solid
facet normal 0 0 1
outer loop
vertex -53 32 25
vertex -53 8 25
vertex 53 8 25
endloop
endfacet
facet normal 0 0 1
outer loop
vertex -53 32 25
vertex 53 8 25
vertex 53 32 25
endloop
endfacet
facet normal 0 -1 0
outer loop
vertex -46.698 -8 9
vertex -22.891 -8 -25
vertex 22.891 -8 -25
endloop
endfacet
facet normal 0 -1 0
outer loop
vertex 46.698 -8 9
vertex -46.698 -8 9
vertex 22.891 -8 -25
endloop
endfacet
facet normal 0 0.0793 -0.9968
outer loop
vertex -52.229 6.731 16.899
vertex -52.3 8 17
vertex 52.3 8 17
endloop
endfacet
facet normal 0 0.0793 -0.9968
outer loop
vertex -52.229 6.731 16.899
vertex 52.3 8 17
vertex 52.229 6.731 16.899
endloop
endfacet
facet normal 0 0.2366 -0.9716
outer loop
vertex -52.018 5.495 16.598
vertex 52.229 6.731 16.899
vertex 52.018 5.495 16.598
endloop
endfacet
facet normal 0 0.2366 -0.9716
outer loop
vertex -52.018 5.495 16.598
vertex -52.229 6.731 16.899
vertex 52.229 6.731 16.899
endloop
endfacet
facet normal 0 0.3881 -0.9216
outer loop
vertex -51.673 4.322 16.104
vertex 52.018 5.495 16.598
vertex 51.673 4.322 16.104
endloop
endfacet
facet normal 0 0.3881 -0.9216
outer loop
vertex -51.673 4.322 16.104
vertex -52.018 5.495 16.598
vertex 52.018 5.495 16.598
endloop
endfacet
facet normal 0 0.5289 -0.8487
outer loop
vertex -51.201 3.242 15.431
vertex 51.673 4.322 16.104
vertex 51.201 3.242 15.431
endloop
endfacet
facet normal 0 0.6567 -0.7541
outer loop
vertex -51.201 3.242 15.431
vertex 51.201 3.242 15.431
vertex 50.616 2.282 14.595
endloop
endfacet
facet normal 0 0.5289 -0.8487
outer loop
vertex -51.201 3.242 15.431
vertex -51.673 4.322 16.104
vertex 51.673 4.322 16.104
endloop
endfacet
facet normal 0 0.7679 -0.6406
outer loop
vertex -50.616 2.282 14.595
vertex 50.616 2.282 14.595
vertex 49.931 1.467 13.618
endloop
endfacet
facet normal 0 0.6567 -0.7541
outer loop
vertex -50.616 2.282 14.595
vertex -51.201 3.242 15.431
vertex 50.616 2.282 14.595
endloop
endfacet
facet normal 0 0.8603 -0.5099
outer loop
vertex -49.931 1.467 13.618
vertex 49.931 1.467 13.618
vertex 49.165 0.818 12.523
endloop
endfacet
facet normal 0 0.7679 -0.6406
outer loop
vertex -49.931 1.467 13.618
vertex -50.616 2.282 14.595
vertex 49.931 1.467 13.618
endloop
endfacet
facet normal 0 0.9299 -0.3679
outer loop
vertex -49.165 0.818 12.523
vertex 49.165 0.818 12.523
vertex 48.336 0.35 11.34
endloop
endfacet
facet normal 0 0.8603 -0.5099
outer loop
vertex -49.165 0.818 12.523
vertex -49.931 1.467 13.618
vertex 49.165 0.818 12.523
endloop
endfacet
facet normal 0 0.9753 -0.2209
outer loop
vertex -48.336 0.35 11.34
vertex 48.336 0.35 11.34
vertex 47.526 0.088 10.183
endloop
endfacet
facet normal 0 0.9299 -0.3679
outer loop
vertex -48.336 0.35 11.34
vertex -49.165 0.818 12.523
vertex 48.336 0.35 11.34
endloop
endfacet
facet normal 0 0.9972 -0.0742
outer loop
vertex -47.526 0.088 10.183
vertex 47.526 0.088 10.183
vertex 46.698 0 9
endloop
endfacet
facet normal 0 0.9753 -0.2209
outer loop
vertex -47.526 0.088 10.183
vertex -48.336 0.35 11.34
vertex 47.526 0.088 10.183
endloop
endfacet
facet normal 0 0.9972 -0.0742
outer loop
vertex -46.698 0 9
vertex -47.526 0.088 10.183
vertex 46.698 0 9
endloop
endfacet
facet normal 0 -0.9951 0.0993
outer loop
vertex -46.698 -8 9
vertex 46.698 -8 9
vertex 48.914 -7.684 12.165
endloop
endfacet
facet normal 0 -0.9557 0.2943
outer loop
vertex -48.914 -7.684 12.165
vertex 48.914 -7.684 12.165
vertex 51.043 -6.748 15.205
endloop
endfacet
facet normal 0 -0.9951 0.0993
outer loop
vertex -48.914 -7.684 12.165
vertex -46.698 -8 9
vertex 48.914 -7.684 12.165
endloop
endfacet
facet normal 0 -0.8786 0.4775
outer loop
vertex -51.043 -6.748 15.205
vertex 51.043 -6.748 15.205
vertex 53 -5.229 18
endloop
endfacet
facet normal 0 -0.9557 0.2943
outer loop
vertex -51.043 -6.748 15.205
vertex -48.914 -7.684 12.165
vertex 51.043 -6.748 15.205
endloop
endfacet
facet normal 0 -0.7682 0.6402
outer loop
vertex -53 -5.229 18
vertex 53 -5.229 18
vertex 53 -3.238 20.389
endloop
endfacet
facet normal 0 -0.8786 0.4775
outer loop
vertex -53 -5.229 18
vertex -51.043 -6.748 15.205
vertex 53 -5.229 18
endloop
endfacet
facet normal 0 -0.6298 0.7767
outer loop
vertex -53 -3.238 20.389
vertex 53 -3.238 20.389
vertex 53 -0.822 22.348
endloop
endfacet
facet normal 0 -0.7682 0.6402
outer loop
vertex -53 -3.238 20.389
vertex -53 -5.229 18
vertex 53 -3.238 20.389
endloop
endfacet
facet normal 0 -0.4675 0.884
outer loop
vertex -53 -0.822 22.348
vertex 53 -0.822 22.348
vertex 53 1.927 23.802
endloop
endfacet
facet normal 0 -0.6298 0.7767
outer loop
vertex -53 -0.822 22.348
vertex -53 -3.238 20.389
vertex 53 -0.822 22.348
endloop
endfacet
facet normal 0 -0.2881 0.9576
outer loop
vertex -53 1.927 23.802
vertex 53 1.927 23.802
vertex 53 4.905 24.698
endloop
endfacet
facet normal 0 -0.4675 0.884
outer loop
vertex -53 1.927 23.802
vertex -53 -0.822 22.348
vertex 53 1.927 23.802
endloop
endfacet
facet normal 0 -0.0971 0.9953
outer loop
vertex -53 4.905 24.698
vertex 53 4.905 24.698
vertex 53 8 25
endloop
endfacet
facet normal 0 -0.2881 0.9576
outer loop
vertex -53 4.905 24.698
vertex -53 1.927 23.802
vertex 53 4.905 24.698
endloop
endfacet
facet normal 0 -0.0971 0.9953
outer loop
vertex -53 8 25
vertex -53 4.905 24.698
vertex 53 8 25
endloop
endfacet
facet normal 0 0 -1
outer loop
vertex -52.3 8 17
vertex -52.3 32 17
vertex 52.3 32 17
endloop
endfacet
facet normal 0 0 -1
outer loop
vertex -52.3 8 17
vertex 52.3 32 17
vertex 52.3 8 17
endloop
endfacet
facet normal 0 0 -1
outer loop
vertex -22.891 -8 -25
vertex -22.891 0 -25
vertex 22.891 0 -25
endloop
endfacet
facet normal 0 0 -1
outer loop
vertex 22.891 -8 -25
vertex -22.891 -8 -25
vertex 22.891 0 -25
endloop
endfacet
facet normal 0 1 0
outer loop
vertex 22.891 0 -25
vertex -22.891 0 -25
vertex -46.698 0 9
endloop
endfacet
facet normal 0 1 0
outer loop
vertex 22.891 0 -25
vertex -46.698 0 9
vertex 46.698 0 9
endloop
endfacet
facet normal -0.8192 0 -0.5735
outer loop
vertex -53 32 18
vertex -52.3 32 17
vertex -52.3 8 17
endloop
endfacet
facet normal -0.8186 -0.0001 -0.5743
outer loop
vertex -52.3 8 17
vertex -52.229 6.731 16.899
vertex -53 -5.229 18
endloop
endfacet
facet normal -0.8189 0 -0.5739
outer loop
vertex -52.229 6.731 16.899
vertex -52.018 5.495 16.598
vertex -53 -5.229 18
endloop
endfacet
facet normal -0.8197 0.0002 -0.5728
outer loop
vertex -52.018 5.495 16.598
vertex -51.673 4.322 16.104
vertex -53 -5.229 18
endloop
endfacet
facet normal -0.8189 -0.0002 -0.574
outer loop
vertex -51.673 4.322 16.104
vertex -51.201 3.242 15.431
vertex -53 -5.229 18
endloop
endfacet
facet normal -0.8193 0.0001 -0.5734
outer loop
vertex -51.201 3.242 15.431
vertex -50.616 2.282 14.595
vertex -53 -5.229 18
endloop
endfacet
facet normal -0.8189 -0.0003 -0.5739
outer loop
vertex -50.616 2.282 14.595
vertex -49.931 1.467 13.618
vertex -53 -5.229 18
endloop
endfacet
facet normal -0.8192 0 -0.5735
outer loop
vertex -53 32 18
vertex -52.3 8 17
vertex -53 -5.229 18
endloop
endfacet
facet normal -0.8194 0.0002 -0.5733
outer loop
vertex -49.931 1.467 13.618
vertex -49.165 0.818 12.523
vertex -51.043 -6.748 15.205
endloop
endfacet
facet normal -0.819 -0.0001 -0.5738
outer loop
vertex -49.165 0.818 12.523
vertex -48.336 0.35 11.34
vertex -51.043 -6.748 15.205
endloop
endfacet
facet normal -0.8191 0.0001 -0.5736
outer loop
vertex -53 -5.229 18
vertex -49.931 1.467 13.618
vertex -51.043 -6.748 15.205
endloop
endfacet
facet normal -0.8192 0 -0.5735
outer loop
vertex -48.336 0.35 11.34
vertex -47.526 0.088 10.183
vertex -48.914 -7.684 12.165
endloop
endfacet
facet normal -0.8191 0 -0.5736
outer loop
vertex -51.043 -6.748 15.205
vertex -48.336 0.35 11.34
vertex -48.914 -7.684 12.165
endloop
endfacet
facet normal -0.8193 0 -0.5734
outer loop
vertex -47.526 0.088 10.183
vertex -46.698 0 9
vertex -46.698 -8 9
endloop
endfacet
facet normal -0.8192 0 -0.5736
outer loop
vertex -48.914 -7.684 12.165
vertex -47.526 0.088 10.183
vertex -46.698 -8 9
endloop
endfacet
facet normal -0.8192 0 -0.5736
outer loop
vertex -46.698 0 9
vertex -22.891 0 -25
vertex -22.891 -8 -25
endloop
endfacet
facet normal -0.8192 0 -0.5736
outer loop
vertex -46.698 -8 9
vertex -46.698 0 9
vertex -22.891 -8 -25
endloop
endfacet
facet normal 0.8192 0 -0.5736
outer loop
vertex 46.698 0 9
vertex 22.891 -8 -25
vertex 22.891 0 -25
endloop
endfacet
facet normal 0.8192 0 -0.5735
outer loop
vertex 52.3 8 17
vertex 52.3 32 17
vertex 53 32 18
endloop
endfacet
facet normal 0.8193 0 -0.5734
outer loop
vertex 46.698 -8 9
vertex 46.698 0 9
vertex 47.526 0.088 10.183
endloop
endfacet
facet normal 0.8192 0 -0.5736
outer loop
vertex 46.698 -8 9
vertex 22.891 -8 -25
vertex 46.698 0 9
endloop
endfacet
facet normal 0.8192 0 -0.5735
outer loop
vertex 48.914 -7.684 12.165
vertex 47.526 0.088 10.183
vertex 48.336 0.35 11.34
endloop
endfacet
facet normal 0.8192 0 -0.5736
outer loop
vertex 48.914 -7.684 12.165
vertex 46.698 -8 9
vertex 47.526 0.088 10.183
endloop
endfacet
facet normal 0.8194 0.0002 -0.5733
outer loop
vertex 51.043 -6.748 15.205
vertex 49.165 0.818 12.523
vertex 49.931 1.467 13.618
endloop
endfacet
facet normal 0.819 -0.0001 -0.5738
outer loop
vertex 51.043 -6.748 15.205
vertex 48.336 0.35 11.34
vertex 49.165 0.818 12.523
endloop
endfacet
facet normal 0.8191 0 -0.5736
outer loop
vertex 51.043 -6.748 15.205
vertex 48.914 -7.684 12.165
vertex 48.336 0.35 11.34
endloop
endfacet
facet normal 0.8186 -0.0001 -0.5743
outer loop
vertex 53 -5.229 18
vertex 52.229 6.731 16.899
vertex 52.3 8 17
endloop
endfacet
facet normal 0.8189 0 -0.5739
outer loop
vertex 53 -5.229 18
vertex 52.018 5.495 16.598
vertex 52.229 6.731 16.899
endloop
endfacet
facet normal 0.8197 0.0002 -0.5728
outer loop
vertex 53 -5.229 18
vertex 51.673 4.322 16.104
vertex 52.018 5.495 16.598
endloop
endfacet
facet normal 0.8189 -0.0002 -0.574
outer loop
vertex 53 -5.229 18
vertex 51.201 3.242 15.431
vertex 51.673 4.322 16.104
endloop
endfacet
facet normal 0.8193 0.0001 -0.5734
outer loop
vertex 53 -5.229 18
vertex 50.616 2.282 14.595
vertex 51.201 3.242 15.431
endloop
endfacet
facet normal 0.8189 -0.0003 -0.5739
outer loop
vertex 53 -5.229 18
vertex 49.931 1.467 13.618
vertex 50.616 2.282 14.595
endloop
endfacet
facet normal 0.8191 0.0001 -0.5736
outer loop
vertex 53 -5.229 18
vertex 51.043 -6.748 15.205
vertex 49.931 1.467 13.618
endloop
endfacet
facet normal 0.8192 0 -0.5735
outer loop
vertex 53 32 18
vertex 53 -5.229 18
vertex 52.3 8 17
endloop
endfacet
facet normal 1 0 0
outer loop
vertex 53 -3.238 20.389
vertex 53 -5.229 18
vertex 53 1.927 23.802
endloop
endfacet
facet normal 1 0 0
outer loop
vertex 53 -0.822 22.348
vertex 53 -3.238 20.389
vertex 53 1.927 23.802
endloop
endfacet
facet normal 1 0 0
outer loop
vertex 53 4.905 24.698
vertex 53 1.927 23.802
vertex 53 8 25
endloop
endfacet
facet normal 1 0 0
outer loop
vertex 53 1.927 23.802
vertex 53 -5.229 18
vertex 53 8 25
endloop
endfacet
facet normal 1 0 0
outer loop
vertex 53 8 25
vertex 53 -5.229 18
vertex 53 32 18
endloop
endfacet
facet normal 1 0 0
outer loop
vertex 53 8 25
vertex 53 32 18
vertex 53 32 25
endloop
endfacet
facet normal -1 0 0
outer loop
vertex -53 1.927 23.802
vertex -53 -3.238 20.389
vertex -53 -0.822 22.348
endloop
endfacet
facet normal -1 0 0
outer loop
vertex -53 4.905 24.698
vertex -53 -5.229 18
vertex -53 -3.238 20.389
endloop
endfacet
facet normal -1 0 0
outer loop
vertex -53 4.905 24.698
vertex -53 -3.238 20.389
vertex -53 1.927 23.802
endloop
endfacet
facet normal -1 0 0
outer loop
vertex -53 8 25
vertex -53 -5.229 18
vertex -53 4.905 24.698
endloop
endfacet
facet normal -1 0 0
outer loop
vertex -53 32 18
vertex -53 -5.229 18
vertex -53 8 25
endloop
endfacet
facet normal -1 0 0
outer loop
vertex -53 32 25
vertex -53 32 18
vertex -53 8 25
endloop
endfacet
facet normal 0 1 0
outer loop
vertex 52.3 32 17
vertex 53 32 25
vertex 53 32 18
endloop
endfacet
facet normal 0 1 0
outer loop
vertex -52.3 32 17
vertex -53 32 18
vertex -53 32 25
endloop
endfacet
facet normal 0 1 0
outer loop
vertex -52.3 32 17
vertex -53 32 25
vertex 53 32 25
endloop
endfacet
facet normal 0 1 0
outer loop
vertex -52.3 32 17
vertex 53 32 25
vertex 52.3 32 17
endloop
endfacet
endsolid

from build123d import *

# Parameters (mm, degrees)
SKETCH1_W                    = 106
SKETCH1_H                    = 50
BASE_FLANGE1_DEPTH           = 8
EDGE_FLANGE1_STRIP_W         = 48
EDGE_FLANGE1_STRIP_H         = 8
EDGE_FLANGE1_STRIP_CUT_DEPTH = 106
EDGE_FLANGE1_DEPTH           = 106
CHAMFER1_SIZE                = 43
CHAMFER1_SIZE2               = 30.108924143
MIRROR3_START                = 33.090682493
MIRROR3_OUTLINE_W            = 56
MIRROR3_OUTLINE_H            = 41
MIRROR3_DEPTH                = 24.663786763


# Read off the part's stored shape, not the designer's step: Mirror3
# Sheet-metal steps are written as plain solids
with BuildPart() as part:
    # Sketch1 → Base-Flange1 (new body)
    with BuildSketch(Plane(origin=(0, 0, 0), x_dir=(1, 0, 0), z_dir=(0, 1, 0))):
        Rectangle(SKETCH1_W, SKETCH1_H)
    extrude(amount=-BASE_FLANGE1_DEPTH)

    # Edge-Flange1 strip (across the edge) → Edge-Flange1 strip cut (cut)
    with BuildSketch(Plane(origin=(-53, 0, 25), x_dir=(0, 0, -1), z_dir=(1, 0, 0))):
        with Locations((-8, -4)):
            Rectangle(EDGE_FLANGE1_STRIP_W, EDGE_FLANGE1_STRIP_H)
    extrude(amount=EDGE_FLANGE1_STRIP_CUT_DEPTH, mode=Mode.SUBTRACT)

    # Edge-Flange1 section (across the edge) → Edge-Flange1 (add)
    with BuildSketch(Plane(origin=(-53, 0, 25), x_dir=(0, 0, -1), z_dir=(1, 0, 0))):
        with BuildLine():
            Line((0, 8), (0, 32))
            Line((0, 32), (8, 32))
            Line((8, 32), (8, 8))
            ThreePointArc((8, 8), (10.343145751, 2.343145751), (16, 0))
            Line((16, 0), (16, -8))
            ThreePointArc((16, -8), (4.686291501, -3.313708499), (0, 8))
        make_face()
    extrude(amount=EDGE_FLANGE1_DEPTH)

    # Chamfer1
    chamfer1_edges = [part.edges().sort_by_distance(p)[0] for p in [
        (-53, -4, -25),
    ]]
    chamfer1_side = [part.faces().sort_by_distance(p)[0] for p in [
        (-53, -0.640312424, -8),
    ]]
    chamfer(chamfer1_edges, length=CHAMFER1_SIZE, length2=CHAMFER1_SIZE2, reference=chamfer1_side[0])

    # Mirror3 outline → Mirror3 (cut)
    with BuildSketch(Plane(origin=(0, 0, 0), x_dir=(0.5735764363510512, 0, 0.8191520442889882), z_dir=(0.8191520442889882, 0, -0.5735764363510512)).offset(MIRROR3_START)):
        with Locations((19, -12.5)):
            Rectangle(MIRROR3_OUTLINE_W, MIRROR3_OUTLINE_H)
    extrude(amount=MIRROR3_DEPTH, mode=Mode.SUBTRACT)


solid = part.part
